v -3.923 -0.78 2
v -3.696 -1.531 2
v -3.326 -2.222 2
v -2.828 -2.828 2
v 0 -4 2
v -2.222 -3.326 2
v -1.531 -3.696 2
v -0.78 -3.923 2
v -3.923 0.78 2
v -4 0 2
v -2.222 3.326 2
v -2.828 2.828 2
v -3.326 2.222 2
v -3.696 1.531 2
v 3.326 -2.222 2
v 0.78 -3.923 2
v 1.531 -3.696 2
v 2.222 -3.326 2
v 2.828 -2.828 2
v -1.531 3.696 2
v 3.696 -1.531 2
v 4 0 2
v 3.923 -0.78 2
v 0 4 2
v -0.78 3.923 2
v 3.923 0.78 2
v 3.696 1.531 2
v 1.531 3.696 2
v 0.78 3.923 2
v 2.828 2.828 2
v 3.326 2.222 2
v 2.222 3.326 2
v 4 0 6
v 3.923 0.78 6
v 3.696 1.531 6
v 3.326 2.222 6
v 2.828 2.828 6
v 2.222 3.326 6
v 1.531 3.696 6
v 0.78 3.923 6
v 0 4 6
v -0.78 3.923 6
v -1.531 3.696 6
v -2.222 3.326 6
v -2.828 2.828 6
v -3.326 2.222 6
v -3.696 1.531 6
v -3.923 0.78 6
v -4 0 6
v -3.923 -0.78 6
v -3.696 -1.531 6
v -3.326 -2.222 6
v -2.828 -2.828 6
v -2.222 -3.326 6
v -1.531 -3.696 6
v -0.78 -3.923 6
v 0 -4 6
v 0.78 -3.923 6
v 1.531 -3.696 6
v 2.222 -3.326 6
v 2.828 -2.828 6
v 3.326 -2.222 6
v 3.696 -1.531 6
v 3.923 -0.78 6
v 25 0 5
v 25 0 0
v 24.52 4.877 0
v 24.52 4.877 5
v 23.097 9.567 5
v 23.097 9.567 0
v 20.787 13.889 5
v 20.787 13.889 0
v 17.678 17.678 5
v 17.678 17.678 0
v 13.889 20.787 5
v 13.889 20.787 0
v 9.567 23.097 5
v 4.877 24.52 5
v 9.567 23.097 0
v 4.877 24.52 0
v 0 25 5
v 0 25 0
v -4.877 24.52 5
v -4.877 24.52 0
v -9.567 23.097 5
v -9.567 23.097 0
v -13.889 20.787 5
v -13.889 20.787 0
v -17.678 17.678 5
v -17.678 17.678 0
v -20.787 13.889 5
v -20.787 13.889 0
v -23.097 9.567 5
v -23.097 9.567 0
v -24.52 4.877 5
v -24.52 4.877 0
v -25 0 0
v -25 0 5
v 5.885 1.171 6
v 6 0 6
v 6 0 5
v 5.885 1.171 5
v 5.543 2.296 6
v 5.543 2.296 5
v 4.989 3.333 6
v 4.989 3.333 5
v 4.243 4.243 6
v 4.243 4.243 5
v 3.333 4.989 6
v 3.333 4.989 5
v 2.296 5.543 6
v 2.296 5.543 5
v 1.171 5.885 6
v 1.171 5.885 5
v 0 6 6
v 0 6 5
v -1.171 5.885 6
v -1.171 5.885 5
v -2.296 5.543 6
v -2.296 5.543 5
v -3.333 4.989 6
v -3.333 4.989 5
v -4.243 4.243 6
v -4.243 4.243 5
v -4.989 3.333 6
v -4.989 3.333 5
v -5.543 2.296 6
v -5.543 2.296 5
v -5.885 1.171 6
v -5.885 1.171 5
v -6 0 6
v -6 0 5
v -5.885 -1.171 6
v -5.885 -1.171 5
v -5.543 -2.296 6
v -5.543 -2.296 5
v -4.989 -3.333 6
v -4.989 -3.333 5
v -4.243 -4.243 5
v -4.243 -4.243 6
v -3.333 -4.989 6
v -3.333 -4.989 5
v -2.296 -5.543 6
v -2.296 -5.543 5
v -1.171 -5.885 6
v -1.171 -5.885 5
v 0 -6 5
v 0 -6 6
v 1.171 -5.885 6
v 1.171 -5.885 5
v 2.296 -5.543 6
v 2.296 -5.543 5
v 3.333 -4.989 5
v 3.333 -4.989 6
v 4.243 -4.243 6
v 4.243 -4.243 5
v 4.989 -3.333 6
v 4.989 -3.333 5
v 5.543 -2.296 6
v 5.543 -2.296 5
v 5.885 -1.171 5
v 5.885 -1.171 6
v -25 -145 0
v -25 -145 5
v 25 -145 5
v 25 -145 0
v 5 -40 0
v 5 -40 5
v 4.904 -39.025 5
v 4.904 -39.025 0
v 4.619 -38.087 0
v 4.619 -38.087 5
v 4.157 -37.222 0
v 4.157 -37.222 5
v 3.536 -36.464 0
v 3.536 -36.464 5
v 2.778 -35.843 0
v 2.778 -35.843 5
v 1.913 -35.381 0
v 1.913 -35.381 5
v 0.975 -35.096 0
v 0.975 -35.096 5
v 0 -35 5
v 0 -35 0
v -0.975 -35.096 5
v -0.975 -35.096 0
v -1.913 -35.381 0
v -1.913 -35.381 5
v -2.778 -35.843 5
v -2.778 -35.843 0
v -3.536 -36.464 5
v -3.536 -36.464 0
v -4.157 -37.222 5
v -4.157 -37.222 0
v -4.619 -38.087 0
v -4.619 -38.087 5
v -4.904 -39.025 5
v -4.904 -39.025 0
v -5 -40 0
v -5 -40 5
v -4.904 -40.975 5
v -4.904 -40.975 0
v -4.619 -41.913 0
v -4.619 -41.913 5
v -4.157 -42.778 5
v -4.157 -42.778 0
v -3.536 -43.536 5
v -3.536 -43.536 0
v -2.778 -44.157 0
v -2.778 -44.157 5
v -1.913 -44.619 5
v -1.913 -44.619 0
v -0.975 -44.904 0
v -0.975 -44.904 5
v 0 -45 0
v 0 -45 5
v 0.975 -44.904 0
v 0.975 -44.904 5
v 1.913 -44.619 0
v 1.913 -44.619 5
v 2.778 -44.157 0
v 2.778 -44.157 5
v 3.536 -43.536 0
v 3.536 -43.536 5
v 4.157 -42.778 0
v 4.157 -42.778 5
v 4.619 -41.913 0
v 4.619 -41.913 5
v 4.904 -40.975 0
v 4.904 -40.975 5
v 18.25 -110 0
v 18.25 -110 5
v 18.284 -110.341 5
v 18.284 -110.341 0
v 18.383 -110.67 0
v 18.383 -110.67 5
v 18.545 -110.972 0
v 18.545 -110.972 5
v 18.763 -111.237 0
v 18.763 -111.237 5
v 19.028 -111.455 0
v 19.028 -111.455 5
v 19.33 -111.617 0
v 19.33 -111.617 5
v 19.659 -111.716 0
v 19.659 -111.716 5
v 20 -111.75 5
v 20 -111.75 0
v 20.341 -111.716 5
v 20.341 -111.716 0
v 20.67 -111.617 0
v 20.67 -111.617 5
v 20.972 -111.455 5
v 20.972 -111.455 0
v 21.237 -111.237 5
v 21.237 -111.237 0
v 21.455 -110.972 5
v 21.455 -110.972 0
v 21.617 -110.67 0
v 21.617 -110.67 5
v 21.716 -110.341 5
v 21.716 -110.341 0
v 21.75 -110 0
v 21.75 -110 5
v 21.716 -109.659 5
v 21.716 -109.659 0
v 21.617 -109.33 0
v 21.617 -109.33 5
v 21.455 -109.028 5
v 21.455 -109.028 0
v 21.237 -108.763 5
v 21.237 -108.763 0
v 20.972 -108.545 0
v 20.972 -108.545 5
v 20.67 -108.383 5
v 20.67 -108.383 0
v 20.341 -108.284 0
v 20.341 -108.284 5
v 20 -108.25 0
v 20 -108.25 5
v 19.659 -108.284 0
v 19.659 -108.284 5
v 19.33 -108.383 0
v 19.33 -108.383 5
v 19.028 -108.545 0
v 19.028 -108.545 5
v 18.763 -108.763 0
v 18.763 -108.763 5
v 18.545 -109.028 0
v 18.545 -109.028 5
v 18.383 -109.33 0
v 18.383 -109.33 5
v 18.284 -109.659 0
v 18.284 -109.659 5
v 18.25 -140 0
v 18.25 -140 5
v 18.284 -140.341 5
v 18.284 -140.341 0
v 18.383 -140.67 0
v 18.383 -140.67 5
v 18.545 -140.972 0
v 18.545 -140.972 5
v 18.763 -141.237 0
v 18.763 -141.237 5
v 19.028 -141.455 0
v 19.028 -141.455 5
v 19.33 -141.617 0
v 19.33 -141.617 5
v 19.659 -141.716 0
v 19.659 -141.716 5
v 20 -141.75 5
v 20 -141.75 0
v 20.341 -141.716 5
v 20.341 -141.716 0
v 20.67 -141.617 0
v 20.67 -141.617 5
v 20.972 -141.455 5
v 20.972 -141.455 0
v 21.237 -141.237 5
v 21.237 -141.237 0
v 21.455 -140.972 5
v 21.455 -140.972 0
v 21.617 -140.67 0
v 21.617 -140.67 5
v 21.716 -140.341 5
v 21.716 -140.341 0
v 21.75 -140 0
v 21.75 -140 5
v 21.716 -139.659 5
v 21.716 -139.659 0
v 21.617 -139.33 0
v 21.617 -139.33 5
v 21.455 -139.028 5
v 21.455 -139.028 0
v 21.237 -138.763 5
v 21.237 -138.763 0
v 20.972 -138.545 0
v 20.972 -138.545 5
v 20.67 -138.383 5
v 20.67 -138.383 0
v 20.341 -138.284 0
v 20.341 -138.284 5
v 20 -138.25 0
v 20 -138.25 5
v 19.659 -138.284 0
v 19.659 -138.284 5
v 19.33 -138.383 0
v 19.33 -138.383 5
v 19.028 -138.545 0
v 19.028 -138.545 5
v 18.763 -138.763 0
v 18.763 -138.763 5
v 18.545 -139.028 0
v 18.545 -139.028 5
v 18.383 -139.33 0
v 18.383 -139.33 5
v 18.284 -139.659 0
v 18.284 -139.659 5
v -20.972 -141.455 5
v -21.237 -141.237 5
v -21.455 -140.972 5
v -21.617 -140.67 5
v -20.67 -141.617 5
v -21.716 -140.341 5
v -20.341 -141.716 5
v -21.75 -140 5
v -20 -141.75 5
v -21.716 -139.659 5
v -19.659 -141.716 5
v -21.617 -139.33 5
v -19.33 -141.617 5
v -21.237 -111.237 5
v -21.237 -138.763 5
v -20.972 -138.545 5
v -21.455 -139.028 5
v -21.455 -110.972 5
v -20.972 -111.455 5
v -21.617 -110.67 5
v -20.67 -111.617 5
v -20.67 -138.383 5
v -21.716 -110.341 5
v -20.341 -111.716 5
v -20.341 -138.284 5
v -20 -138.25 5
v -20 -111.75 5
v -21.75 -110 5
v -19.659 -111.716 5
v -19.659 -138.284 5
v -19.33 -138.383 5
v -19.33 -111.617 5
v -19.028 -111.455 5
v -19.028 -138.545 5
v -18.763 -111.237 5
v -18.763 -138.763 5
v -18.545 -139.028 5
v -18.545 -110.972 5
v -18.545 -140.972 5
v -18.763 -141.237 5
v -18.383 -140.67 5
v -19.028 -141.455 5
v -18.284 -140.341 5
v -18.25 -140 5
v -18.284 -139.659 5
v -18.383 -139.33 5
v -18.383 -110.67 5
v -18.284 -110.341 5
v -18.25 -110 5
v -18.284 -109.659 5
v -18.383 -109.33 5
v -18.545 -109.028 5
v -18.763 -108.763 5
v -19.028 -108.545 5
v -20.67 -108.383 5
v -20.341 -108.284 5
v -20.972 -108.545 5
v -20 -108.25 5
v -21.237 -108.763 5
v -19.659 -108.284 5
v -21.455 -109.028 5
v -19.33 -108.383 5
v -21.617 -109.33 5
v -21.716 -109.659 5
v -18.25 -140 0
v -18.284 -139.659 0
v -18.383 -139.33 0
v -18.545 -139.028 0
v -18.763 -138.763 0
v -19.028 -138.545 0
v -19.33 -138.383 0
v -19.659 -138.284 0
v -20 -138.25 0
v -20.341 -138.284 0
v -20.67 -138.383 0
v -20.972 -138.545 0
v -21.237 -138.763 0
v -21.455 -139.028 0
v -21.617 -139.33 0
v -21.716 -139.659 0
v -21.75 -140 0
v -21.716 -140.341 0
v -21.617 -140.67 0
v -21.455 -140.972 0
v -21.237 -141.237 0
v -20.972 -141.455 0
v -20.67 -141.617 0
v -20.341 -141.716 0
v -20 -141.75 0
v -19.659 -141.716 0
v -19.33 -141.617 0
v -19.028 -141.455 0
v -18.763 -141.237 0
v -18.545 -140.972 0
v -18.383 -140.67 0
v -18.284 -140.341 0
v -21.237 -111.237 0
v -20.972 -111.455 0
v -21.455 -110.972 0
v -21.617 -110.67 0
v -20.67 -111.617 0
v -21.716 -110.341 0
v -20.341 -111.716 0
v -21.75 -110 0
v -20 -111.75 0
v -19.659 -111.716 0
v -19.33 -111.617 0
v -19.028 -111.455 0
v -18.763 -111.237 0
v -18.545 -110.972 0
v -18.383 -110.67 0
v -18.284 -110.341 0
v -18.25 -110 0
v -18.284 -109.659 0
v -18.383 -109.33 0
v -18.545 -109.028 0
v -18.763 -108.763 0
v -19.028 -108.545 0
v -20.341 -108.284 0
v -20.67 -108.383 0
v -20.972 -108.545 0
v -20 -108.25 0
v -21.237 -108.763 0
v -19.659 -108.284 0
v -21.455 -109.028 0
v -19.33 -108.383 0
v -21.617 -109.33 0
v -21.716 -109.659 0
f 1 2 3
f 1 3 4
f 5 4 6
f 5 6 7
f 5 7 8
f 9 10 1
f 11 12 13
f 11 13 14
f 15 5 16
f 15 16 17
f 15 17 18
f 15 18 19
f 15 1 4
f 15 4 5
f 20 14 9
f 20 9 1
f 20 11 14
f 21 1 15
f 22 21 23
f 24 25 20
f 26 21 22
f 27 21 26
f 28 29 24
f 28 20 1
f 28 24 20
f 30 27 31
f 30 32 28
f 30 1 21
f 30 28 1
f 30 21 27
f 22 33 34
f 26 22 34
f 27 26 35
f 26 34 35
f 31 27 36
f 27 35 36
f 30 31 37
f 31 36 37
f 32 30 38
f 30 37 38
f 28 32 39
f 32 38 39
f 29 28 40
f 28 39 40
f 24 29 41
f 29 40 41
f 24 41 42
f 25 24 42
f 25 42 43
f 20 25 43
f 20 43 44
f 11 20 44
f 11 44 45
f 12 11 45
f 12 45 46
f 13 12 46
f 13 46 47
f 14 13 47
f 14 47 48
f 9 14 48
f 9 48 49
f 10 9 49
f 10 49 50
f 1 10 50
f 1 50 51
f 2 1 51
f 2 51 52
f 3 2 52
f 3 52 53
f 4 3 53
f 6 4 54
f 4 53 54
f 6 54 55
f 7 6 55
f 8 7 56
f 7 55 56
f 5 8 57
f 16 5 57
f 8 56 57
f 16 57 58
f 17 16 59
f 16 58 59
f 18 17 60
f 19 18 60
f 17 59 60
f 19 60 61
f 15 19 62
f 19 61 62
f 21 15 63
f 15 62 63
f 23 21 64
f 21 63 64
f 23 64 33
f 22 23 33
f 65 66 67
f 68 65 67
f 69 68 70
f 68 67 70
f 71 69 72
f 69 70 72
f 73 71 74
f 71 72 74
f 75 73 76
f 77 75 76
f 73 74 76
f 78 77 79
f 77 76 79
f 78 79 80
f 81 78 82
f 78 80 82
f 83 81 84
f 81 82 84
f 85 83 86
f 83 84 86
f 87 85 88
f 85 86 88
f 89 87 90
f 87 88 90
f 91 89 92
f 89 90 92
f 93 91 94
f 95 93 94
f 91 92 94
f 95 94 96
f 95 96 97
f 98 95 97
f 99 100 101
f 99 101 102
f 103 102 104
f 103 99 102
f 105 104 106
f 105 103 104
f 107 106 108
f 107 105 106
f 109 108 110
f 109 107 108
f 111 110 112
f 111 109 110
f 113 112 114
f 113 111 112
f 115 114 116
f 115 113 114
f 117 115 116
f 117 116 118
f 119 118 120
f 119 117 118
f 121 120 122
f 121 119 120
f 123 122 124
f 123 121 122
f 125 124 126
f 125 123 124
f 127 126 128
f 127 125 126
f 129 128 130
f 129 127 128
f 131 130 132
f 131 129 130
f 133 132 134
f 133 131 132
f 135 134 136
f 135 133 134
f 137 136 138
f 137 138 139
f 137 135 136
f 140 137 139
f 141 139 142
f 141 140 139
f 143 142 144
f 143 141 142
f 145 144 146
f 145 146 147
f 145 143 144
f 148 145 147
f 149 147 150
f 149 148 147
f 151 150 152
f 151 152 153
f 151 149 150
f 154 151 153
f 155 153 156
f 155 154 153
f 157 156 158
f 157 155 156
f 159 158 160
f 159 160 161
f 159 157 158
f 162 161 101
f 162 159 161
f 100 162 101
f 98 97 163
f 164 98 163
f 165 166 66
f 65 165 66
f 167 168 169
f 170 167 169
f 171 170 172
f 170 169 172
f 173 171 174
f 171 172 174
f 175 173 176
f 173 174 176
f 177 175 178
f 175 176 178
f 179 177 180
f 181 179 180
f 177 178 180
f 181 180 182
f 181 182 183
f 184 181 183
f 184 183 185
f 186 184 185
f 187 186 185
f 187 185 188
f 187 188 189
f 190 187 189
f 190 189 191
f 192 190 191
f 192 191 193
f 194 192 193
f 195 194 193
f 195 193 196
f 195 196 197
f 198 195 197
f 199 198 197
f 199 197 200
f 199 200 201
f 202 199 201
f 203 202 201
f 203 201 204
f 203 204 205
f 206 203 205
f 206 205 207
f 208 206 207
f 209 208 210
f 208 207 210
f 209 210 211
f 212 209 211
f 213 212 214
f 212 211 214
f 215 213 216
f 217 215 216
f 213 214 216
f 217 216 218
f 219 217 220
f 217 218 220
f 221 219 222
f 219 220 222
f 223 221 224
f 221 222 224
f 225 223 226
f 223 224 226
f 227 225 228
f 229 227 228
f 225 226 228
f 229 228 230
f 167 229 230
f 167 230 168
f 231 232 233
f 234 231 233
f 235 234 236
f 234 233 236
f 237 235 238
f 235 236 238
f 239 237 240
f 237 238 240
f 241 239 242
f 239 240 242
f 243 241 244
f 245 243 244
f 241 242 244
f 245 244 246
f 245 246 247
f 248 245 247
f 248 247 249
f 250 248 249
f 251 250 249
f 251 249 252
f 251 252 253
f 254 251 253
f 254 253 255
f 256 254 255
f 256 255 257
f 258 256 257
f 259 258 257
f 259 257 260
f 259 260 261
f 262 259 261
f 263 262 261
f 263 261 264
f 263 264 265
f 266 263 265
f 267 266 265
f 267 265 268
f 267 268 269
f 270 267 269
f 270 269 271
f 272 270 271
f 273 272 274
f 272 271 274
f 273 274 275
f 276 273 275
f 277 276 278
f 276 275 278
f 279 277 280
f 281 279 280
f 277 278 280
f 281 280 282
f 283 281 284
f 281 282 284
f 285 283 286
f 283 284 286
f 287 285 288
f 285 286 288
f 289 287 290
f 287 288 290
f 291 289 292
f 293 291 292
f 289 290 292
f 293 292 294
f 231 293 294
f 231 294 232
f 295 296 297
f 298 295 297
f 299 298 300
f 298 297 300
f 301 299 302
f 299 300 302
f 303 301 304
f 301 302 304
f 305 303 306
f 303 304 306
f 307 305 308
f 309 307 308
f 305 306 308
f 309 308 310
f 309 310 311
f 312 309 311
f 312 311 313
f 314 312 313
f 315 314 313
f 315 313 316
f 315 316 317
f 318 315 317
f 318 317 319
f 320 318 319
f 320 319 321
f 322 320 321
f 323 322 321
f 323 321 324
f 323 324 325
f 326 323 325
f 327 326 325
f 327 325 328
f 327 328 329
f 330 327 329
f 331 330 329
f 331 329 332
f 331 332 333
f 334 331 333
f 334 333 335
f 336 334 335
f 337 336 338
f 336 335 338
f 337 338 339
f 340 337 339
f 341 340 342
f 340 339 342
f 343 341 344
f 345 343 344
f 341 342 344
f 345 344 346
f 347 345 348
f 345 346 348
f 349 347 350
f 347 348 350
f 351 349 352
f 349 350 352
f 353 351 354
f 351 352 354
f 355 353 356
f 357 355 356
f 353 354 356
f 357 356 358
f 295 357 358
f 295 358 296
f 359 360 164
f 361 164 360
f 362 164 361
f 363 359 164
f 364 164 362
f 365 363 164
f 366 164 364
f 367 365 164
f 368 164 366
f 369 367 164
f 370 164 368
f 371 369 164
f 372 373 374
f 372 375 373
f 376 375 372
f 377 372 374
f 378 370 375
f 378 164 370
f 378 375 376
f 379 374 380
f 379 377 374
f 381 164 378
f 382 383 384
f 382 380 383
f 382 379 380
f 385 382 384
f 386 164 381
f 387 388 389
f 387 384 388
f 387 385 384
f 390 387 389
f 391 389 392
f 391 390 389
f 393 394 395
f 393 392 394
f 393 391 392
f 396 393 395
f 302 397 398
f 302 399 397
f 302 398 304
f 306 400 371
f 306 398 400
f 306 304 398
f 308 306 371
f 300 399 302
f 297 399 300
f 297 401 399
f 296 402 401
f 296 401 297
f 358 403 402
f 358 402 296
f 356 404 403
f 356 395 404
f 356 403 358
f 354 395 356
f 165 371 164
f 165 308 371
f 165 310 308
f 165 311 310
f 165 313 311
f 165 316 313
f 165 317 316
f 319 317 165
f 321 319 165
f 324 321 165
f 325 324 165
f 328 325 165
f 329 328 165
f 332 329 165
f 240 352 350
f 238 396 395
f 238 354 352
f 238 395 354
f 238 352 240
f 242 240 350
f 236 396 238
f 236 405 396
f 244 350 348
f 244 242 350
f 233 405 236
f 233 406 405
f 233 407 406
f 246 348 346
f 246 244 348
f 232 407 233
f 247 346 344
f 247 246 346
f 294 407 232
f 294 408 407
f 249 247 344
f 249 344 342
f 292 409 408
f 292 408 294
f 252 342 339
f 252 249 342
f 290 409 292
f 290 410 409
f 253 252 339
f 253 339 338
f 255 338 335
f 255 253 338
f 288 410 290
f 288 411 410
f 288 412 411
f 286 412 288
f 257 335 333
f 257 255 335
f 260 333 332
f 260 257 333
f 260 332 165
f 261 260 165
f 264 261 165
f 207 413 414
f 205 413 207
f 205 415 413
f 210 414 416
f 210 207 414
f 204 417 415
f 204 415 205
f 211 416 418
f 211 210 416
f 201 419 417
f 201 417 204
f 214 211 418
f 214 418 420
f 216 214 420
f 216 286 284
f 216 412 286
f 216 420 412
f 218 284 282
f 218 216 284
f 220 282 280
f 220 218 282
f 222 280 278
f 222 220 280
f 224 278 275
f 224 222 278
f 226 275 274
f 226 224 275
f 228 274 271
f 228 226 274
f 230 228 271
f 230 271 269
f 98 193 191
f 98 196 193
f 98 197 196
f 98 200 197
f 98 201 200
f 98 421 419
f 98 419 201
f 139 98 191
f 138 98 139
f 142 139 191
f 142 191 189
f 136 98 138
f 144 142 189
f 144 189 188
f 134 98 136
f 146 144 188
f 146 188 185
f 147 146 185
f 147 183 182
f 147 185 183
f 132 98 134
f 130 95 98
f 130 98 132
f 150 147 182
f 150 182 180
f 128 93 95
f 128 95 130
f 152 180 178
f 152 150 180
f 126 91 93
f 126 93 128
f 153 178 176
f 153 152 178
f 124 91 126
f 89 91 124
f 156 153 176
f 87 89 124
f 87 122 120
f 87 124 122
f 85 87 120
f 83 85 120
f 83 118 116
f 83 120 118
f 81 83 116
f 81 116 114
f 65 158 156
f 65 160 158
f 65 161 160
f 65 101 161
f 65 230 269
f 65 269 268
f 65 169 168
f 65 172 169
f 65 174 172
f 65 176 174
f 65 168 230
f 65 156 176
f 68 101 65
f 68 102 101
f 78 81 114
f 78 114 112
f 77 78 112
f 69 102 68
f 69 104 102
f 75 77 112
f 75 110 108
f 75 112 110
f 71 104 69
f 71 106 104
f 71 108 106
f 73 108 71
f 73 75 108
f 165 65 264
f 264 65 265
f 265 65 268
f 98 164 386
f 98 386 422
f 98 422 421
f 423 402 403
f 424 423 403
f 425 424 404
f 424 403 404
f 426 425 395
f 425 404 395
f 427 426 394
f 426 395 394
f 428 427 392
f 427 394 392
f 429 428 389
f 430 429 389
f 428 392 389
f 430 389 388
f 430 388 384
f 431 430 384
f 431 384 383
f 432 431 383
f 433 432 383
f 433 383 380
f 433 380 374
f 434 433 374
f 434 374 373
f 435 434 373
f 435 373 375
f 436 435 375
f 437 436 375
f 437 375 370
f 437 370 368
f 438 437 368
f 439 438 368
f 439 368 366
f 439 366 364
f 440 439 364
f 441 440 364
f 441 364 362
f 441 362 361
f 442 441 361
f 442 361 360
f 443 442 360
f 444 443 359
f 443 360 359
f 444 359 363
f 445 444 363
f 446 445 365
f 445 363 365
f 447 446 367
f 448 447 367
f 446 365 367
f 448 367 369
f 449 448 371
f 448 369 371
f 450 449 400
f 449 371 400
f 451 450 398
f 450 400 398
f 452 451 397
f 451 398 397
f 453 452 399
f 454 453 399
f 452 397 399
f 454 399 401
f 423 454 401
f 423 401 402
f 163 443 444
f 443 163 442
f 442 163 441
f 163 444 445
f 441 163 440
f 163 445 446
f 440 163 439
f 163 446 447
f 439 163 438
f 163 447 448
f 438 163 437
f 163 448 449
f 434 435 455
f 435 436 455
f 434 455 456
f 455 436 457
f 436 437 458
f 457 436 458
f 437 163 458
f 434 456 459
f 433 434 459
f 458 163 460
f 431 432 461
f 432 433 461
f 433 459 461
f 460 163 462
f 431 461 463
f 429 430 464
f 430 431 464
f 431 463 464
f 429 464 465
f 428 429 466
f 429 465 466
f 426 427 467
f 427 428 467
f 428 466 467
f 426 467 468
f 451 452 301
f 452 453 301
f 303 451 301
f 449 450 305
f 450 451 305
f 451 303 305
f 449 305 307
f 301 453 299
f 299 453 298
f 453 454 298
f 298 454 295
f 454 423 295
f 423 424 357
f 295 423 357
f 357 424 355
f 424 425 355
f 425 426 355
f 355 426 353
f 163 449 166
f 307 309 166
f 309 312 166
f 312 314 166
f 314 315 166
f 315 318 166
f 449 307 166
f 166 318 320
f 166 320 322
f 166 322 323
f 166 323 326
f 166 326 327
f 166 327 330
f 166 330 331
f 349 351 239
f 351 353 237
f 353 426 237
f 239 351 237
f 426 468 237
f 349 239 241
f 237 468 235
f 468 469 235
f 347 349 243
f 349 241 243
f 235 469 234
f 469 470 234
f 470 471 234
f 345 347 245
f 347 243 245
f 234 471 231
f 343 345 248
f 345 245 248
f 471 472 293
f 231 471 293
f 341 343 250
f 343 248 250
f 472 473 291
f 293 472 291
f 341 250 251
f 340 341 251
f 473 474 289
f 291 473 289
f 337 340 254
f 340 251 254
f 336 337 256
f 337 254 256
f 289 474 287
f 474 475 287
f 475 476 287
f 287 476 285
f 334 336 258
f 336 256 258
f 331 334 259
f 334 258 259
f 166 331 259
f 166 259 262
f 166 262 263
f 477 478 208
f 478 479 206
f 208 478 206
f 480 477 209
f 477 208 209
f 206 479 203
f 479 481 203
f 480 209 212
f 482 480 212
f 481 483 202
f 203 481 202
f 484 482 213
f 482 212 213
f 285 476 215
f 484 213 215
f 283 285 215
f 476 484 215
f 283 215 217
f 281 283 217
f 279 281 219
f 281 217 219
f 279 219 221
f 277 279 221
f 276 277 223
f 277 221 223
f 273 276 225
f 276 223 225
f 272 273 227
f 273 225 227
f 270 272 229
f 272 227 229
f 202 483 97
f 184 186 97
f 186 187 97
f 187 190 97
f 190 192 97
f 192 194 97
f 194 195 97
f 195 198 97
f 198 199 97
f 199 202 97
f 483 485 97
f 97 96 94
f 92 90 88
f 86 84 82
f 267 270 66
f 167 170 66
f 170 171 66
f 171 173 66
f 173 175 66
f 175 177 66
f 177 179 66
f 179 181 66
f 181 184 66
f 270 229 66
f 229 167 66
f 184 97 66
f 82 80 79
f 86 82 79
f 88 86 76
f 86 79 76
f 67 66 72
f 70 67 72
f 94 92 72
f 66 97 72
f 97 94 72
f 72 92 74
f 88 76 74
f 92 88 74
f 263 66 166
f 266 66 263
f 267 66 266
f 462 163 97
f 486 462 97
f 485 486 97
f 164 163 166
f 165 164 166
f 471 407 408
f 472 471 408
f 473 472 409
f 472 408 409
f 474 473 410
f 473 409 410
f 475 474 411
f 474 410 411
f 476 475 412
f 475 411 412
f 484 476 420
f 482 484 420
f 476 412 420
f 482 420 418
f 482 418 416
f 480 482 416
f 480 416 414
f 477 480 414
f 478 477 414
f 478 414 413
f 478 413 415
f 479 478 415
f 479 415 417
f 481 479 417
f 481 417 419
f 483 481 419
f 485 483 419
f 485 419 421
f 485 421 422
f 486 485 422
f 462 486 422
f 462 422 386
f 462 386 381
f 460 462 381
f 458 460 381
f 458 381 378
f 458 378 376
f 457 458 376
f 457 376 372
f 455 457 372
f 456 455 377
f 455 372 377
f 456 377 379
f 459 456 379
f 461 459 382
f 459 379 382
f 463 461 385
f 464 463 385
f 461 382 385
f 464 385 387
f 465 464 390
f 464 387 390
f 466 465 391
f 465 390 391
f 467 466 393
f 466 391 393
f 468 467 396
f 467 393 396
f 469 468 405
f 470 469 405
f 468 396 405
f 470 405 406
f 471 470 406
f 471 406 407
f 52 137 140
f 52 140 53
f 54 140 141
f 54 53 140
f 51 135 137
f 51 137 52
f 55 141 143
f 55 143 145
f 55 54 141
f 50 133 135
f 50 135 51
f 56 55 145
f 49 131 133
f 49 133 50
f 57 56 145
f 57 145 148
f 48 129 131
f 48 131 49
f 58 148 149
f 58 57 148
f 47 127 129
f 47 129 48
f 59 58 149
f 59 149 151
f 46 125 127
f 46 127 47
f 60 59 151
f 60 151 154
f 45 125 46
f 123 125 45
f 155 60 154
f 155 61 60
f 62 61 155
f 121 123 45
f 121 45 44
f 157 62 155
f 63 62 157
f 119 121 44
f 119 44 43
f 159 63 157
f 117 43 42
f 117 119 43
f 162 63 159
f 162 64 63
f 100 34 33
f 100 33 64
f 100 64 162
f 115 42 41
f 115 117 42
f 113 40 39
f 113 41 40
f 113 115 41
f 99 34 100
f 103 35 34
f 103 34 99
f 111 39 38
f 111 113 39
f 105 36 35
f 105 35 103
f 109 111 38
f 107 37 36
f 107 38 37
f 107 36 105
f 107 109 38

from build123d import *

# Parameters (mm, degrees)
BOSS_EXTRUDE1_DEPTH = 5
SKETCH2_R           = 4
CUT_EXTRUDE1_DEPTH  = 3
BOSS_EXTRUDE2_START = 1
SKETCH3_R           = 6
SKETCH3_R_2         = 4
BOSS_EXTRUDE2_DEPTH = 1
SKETCH4_R           = 1.75
CUT_EXTRUDE2_DEPTH  = 148.224318643
SKETCH5_R           = 5
CUT_EXTRUDE3_DEPTH  = 148.224318643


with BuildPart() as part:
    # Sketch1 → Boss-Extrude1 (new body)
    with BuildSketch(Plane.XY):
        with BuildLine():
            Line((-25, -145), (25, -145))
            Line((25, -145), (25, 0))
            ThreePointArc((25, 0), (0, 25), (-25, 0))
            Line((-25, 0), (-25, -145))
        make_face()
    extrude(amount=BOSS_EXTRUDE1_DEPTH)

    # Sketch2 → Cut-Extrude1 (cut)
    with BuildSketch(Plane.XY.offset(5)):
        Circle(SKETCH2_R)
    extrude(amount=-CUT_EXTRUDE1_DEPTH, mode=Mode.SUBTRACT)

    # Sketch3 → Boss-Extrude2 (add)
    with BuildSketch(Plane.XY.offset(5).offset(BOSS_EXTRUDE2_START)):
        Circle(SKETCH3_R)
        Circle(SKETCH3_R_2, mode=Mode.SUBTRACT)
    extrude(amount=-BOSS_EXTRUDE2_DEPTH)

    # Sketch4 → Cut-Extrude2 (cut, through all)
    with BuildSketch(Plane.XY.offset(5)):
        with Locations((-20, -140)):
            Circle(SKETCH4_R)
        with Locations((-20, -110)):
            Circle(SKETCH4_R)
        with Locations(Location((20, -110, 0), (0, 0, 180))):
            Circle(SKETCH4_R)
        with Locations(Location((20, -140, 0), (0, 0, 180))):
            Circle(SKETCH4_R)
    extrude(amount=-CUT_EXTRUDE2_DEPTH, mode=Mode.SUBTRACT)

    # Sketch5 → Cut-Extrude3 (cut, through all)
    with BuildSketch(Plane.XY.offset(5)):
        with Locations((0, -40)):
            Circle(SKETCH5_R)
    extrude(amount=-CUT_EXTRUDE3_DEPTH, mode=Mode.SUBTRACT)


solid = part.part
